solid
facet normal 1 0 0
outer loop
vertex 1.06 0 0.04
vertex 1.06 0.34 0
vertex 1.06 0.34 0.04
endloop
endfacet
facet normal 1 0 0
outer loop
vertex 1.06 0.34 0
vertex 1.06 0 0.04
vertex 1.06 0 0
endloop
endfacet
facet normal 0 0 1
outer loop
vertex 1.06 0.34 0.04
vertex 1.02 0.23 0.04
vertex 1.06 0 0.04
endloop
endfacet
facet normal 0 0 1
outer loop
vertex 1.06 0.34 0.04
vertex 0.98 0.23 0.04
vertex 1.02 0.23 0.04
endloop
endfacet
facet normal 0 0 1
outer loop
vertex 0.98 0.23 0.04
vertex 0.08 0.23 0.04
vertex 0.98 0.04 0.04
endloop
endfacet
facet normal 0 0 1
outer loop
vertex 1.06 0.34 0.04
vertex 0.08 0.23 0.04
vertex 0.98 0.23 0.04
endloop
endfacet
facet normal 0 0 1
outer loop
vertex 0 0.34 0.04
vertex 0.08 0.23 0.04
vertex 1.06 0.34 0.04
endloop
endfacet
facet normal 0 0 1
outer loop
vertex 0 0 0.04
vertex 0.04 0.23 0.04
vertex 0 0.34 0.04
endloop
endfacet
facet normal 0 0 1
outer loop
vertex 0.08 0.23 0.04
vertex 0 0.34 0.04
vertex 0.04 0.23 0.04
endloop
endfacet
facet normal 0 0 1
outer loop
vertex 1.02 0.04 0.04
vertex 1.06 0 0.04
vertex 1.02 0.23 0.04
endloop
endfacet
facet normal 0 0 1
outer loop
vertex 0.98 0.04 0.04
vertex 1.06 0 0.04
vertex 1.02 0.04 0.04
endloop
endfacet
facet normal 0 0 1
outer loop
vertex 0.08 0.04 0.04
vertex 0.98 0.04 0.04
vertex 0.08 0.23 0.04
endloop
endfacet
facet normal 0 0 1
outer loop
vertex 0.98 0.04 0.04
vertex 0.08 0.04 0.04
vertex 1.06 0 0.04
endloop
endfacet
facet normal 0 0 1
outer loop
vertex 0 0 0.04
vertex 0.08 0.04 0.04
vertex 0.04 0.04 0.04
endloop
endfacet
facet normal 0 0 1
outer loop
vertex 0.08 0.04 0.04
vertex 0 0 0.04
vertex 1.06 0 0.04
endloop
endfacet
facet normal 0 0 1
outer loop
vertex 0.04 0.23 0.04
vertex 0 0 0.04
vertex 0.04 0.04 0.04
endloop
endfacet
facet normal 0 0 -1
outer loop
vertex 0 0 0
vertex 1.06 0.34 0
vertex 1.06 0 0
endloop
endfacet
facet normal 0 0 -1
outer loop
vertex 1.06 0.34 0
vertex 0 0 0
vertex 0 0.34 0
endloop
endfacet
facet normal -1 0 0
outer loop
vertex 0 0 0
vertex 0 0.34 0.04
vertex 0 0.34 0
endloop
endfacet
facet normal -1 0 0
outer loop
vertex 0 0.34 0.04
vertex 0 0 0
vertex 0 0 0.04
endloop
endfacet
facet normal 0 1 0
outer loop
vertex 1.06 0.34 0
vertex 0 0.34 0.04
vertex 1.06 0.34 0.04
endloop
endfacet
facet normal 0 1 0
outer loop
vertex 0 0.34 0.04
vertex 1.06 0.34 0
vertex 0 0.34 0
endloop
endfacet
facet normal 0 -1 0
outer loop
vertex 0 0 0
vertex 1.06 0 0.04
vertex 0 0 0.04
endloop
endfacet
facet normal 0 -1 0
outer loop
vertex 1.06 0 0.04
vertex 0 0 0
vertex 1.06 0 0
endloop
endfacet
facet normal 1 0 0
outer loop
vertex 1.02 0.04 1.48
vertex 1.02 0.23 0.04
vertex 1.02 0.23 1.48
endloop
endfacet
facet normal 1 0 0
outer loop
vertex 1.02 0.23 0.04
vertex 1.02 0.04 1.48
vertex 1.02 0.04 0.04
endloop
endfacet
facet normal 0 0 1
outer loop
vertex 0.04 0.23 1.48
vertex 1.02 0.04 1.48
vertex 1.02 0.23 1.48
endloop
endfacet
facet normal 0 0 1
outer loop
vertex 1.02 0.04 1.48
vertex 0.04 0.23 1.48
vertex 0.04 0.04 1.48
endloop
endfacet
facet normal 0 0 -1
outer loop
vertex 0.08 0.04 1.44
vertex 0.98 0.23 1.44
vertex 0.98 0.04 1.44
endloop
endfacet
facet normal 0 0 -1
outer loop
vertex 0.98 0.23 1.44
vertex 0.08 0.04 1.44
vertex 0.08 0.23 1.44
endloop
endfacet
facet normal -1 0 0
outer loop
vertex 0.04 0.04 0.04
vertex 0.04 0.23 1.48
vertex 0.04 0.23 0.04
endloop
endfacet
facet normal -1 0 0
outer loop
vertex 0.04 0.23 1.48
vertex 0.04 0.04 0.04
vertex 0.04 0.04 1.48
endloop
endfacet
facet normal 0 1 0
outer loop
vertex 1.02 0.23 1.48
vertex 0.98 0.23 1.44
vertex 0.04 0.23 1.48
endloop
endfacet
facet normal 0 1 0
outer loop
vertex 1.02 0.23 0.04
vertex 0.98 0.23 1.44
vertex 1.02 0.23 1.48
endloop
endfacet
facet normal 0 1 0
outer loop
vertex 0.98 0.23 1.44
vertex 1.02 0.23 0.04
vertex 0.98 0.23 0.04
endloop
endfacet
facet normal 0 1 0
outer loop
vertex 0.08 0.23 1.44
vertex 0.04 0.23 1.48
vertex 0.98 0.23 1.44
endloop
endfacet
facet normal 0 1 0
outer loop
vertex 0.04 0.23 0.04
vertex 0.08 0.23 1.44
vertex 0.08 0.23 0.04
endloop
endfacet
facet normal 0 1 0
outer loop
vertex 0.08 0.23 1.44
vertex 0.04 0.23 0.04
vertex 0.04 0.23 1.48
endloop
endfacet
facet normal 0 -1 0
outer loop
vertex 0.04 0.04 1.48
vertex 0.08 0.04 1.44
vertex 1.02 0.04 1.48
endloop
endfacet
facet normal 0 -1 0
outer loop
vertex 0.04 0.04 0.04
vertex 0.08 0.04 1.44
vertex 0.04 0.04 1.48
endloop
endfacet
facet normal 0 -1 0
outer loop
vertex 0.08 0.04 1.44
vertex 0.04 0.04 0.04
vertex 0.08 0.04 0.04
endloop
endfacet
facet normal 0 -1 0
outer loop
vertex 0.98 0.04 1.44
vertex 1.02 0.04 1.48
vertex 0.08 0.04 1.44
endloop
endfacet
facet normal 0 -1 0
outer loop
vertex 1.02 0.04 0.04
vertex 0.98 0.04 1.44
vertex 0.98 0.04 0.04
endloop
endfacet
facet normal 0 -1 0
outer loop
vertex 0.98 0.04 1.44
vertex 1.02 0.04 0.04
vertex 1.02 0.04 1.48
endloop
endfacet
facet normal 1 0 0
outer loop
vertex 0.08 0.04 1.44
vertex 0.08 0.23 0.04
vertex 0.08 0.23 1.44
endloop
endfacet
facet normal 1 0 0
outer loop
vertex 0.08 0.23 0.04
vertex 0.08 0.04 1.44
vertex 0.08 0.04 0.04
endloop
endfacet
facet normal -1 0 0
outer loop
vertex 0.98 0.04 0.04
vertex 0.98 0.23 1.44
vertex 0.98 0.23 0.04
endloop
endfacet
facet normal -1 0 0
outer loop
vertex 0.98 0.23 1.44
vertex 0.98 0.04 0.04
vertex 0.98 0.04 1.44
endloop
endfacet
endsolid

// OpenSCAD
module marmo_porta_ingresso()
{

	cube([1.05,0.23,0.04]);
	translate([0.04,0.04,2.44]) cube([0.97, 0.19, 0.04]);
	translate([0.04,0.04,0.04]) cube([0.04,0.19,2.40]);
	translate([0.97,0.04,0.04]) cube([0.04,0.19,2.40]);
}
module marmo_finestra_ingresso()
{

	cube([1.36,0.34,0.04]);
	translate([0.04,0.04,1.44]) cube([1.28, 0.19, 0.04]);
	translate([0.04,0.04,0.04]) cube([0.04,0.19,1.40]);
	translate([1.28,0.04,0.04]) cube([0.04,0.19,1.40]);
}
module marmo_finestra_bagno()
{
	cube([0.81,0.34,0.04]);
	translate([0.04,0.04,1.44]) cube([0.73, 0.19, 0.04]);
	translate([0.04,0.04,0.04]) cube([0.04,0.19,1.40]);
	translate([0.73,0.04,0.04]) cube([0.04,0.19,1.40]);
}
module marmo_finestra_camerina()
{
	cube([1.06,0.34,0.04]);
	translate([0.04,0.04,1.44]) cube([0.98, 0.19, 0.04]);
	translate([0.04,0.04,0.04]) cube([0.04,0.19,1.40]);
	translate([0.98,0.04,0.04]) cube([0.04,0.19,1.40]);
}
color("lightgrey") marmo_finestra_camerina();
